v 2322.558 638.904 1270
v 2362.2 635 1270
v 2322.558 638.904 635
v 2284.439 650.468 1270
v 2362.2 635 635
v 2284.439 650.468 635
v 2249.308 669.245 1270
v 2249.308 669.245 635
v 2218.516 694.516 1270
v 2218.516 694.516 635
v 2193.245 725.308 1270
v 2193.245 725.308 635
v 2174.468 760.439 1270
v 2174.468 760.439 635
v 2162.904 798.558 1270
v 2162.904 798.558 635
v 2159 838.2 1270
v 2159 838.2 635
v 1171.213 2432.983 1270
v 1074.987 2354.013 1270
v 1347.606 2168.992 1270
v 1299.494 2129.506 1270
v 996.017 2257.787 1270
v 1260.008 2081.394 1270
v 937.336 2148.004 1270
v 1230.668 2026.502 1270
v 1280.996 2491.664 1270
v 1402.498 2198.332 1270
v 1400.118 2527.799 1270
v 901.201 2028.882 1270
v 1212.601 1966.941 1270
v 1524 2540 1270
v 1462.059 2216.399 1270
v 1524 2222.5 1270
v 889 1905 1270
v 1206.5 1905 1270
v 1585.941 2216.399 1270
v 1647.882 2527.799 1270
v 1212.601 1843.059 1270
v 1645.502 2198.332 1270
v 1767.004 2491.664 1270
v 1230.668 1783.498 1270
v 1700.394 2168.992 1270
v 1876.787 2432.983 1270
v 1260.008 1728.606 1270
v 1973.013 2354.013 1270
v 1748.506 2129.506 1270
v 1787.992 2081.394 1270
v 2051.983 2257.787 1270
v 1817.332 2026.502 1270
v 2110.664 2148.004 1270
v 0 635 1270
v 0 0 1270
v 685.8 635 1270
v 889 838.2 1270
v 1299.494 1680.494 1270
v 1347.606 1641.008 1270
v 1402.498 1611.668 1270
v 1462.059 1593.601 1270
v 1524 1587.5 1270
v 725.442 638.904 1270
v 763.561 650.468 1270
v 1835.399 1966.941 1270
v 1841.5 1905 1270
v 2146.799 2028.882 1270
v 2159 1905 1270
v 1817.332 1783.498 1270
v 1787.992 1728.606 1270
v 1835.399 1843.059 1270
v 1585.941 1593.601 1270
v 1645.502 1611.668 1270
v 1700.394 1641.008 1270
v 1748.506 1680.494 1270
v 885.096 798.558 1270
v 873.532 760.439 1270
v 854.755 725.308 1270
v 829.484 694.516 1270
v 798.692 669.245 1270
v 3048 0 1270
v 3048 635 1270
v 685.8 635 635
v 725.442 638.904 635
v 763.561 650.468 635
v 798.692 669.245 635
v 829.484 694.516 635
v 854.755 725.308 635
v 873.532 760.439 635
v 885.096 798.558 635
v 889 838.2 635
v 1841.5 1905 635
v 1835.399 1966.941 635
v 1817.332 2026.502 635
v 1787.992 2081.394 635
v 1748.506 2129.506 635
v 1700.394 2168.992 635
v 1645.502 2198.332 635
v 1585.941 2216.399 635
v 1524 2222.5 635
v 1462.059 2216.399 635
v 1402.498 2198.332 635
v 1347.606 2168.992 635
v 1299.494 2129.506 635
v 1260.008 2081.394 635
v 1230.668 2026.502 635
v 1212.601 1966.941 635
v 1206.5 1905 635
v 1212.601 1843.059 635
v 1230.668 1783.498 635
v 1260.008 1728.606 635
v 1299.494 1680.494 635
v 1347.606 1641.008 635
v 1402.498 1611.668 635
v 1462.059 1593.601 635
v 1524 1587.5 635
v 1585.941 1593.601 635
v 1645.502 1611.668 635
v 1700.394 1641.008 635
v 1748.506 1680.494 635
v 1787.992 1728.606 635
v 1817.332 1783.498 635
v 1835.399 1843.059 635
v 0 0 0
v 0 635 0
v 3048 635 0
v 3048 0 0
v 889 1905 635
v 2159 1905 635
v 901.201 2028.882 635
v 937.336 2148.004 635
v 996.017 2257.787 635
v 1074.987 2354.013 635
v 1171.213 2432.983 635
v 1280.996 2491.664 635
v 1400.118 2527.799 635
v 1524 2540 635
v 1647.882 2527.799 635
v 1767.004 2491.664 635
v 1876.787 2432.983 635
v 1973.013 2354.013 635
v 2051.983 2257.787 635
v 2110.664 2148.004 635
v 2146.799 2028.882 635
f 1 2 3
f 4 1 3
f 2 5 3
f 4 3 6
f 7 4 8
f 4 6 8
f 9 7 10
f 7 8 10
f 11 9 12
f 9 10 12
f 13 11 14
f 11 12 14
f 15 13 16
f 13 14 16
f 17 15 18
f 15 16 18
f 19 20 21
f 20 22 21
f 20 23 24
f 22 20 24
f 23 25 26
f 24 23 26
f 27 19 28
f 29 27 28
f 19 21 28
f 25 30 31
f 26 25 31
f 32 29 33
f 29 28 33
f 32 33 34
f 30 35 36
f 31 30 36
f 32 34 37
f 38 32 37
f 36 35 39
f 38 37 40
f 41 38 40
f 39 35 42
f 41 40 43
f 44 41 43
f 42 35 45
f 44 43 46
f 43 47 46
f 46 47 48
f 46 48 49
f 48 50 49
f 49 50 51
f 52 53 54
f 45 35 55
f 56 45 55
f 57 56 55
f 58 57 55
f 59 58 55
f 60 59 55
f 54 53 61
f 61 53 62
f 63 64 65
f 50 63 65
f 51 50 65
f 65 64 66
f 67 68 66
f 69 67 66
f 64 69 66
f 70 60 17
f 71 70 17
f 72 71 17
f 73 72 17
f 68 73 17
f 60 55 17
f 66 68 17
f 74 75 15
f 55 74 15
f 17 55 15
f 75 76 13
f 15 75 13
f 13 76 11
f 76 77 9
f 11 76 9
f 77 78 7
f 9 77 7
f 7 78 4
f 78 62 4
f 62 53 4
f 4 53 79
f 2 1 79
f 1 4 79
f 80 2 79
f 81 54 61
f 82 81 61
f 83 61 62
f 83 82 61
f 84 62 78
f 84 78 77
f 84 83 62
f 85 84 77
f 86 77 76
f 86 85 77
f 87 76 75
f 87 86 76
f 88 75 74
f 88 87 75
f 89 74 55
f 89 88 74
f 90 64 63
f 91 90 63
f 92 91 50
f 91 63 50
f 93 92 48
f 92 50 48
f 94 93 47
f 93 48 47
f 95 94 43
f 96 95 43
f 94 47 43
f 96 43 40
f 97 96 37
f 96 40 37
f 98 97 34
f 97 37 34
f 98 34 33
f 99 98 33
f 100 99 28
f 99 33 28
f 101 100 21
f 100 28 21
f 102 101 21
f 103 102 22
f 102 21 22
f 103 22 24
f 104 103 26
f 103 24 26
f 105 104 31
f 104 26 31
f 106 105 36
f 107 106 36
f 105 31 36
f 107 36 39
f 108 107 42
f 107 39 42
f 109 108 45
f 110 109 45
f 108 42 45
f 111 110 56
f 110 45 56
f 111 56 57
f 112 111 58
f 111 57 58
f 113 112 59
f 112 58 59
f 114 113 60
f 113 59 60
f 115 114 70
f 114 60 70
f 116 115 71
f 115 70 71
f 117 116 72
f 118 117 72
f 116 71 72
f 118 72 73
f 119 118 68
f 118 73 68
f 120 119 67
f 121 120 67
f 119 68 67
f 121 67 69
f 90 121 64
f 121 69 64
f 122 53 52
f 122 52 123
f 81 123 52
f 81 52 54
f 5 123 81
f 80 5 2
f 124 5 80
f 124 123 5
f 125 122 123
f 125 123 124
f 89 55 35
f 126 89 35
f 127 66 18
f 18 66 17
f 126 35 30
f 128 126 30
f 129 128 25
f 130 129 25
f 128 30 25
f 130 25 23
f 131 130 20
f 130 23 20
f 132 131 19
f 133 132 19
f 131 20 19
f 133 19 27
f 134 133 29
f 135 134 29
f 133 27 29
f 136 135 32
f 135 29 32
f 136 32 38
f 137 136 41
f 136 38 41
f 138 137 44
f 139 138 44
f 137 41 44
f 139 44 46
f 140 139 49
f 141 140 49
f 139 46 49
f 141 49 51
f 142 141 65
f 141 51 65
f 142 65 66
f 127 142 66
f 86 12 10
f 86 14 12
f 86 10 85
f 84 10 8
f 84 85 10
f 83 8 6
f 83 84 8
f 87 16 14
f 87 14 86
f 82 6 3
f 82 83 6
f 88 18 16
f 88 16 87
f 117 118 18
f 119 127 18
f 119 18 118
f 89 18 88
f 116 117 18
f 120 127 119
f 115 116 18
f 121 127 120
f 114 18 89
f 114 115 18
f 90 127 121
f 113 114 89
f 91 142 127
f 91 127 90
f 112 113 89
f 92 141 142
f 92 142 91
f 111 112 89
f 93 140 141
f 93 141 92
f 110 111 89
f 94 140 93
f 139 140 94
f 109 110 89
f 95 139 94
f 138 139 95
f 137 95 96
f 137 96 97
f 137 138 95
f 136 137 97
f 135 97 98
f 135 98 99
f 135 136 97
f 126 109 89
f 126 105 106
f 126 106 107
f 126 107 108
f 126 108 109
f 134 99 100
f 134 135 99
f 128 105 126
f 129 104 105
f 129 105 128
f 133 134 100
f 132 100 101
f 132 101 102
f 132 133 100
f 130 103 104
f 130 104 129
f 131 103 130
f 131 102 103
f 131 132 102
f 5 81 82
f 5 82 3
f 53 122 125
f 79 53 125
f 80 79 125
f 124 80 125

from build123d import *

# Parameters (mm, degrees)
RECTANGLE_SKETCH_W           = 3048
RECTANGLE_SKETCH_H           = 1270
RECTANGLEEXTRUDE_DEPTH       = 635
CURVEDRECTANGLESKETCH_R      = 317.5
CURVEDRECTANGLEEXTRUDE_DEPTH = 635
CURVEDRECTANGLEFILLET_R      = 203.2


with BuildPart() as part:
    # Rectangle Sketch → RectangleExtrude (new body)
    with BuildSketch(Plane(origin=(0, 0, 0), x_dir=(1, 0, 0), z_dir=(0, 1, 0))):
        with Locations((1524, -635)):
            Rectangle(RECTANGLE_SKETCH_W, RECTANGLE_SKETCH_H)
    extrude(amount=RECTANGLEEXTRUDE_DEPTH)

    # CurvedRectangleSketch → CurvedRectangleExtrude (add)
    with BuildSketch(Plane.XY.offset(1270)):
        with BuildLine():
            Line((889, 635), (889, 1905))
            ThreePointArc((889, 1905), (1524, 2540), (2159, 1905))
            Line((2159, 1905), (2159, 635))
            Line((2159, 635), (889, 635))
        make_face()
        with Locations((1524, 1905)):
            Circle(CURVEDRECTANGLESKETCH_R, mode=Mode.SUBTRACT)
    extrude(amount=-CURVEDRECTANGLEEXTRUDE_DEPTH)

    # CurvedRectangleFillet
    curvedrectanglefillet_edges = [part.edges().sort_by_distance(p)[0] for p in [
        (889, 635, 952.5),
        (2159, 635, 952.5),
    ]]
    fillet(curvedrectanglefillet_edges, radius=CURVEDRECTANGLEFILLET_R)


solid = part.part
